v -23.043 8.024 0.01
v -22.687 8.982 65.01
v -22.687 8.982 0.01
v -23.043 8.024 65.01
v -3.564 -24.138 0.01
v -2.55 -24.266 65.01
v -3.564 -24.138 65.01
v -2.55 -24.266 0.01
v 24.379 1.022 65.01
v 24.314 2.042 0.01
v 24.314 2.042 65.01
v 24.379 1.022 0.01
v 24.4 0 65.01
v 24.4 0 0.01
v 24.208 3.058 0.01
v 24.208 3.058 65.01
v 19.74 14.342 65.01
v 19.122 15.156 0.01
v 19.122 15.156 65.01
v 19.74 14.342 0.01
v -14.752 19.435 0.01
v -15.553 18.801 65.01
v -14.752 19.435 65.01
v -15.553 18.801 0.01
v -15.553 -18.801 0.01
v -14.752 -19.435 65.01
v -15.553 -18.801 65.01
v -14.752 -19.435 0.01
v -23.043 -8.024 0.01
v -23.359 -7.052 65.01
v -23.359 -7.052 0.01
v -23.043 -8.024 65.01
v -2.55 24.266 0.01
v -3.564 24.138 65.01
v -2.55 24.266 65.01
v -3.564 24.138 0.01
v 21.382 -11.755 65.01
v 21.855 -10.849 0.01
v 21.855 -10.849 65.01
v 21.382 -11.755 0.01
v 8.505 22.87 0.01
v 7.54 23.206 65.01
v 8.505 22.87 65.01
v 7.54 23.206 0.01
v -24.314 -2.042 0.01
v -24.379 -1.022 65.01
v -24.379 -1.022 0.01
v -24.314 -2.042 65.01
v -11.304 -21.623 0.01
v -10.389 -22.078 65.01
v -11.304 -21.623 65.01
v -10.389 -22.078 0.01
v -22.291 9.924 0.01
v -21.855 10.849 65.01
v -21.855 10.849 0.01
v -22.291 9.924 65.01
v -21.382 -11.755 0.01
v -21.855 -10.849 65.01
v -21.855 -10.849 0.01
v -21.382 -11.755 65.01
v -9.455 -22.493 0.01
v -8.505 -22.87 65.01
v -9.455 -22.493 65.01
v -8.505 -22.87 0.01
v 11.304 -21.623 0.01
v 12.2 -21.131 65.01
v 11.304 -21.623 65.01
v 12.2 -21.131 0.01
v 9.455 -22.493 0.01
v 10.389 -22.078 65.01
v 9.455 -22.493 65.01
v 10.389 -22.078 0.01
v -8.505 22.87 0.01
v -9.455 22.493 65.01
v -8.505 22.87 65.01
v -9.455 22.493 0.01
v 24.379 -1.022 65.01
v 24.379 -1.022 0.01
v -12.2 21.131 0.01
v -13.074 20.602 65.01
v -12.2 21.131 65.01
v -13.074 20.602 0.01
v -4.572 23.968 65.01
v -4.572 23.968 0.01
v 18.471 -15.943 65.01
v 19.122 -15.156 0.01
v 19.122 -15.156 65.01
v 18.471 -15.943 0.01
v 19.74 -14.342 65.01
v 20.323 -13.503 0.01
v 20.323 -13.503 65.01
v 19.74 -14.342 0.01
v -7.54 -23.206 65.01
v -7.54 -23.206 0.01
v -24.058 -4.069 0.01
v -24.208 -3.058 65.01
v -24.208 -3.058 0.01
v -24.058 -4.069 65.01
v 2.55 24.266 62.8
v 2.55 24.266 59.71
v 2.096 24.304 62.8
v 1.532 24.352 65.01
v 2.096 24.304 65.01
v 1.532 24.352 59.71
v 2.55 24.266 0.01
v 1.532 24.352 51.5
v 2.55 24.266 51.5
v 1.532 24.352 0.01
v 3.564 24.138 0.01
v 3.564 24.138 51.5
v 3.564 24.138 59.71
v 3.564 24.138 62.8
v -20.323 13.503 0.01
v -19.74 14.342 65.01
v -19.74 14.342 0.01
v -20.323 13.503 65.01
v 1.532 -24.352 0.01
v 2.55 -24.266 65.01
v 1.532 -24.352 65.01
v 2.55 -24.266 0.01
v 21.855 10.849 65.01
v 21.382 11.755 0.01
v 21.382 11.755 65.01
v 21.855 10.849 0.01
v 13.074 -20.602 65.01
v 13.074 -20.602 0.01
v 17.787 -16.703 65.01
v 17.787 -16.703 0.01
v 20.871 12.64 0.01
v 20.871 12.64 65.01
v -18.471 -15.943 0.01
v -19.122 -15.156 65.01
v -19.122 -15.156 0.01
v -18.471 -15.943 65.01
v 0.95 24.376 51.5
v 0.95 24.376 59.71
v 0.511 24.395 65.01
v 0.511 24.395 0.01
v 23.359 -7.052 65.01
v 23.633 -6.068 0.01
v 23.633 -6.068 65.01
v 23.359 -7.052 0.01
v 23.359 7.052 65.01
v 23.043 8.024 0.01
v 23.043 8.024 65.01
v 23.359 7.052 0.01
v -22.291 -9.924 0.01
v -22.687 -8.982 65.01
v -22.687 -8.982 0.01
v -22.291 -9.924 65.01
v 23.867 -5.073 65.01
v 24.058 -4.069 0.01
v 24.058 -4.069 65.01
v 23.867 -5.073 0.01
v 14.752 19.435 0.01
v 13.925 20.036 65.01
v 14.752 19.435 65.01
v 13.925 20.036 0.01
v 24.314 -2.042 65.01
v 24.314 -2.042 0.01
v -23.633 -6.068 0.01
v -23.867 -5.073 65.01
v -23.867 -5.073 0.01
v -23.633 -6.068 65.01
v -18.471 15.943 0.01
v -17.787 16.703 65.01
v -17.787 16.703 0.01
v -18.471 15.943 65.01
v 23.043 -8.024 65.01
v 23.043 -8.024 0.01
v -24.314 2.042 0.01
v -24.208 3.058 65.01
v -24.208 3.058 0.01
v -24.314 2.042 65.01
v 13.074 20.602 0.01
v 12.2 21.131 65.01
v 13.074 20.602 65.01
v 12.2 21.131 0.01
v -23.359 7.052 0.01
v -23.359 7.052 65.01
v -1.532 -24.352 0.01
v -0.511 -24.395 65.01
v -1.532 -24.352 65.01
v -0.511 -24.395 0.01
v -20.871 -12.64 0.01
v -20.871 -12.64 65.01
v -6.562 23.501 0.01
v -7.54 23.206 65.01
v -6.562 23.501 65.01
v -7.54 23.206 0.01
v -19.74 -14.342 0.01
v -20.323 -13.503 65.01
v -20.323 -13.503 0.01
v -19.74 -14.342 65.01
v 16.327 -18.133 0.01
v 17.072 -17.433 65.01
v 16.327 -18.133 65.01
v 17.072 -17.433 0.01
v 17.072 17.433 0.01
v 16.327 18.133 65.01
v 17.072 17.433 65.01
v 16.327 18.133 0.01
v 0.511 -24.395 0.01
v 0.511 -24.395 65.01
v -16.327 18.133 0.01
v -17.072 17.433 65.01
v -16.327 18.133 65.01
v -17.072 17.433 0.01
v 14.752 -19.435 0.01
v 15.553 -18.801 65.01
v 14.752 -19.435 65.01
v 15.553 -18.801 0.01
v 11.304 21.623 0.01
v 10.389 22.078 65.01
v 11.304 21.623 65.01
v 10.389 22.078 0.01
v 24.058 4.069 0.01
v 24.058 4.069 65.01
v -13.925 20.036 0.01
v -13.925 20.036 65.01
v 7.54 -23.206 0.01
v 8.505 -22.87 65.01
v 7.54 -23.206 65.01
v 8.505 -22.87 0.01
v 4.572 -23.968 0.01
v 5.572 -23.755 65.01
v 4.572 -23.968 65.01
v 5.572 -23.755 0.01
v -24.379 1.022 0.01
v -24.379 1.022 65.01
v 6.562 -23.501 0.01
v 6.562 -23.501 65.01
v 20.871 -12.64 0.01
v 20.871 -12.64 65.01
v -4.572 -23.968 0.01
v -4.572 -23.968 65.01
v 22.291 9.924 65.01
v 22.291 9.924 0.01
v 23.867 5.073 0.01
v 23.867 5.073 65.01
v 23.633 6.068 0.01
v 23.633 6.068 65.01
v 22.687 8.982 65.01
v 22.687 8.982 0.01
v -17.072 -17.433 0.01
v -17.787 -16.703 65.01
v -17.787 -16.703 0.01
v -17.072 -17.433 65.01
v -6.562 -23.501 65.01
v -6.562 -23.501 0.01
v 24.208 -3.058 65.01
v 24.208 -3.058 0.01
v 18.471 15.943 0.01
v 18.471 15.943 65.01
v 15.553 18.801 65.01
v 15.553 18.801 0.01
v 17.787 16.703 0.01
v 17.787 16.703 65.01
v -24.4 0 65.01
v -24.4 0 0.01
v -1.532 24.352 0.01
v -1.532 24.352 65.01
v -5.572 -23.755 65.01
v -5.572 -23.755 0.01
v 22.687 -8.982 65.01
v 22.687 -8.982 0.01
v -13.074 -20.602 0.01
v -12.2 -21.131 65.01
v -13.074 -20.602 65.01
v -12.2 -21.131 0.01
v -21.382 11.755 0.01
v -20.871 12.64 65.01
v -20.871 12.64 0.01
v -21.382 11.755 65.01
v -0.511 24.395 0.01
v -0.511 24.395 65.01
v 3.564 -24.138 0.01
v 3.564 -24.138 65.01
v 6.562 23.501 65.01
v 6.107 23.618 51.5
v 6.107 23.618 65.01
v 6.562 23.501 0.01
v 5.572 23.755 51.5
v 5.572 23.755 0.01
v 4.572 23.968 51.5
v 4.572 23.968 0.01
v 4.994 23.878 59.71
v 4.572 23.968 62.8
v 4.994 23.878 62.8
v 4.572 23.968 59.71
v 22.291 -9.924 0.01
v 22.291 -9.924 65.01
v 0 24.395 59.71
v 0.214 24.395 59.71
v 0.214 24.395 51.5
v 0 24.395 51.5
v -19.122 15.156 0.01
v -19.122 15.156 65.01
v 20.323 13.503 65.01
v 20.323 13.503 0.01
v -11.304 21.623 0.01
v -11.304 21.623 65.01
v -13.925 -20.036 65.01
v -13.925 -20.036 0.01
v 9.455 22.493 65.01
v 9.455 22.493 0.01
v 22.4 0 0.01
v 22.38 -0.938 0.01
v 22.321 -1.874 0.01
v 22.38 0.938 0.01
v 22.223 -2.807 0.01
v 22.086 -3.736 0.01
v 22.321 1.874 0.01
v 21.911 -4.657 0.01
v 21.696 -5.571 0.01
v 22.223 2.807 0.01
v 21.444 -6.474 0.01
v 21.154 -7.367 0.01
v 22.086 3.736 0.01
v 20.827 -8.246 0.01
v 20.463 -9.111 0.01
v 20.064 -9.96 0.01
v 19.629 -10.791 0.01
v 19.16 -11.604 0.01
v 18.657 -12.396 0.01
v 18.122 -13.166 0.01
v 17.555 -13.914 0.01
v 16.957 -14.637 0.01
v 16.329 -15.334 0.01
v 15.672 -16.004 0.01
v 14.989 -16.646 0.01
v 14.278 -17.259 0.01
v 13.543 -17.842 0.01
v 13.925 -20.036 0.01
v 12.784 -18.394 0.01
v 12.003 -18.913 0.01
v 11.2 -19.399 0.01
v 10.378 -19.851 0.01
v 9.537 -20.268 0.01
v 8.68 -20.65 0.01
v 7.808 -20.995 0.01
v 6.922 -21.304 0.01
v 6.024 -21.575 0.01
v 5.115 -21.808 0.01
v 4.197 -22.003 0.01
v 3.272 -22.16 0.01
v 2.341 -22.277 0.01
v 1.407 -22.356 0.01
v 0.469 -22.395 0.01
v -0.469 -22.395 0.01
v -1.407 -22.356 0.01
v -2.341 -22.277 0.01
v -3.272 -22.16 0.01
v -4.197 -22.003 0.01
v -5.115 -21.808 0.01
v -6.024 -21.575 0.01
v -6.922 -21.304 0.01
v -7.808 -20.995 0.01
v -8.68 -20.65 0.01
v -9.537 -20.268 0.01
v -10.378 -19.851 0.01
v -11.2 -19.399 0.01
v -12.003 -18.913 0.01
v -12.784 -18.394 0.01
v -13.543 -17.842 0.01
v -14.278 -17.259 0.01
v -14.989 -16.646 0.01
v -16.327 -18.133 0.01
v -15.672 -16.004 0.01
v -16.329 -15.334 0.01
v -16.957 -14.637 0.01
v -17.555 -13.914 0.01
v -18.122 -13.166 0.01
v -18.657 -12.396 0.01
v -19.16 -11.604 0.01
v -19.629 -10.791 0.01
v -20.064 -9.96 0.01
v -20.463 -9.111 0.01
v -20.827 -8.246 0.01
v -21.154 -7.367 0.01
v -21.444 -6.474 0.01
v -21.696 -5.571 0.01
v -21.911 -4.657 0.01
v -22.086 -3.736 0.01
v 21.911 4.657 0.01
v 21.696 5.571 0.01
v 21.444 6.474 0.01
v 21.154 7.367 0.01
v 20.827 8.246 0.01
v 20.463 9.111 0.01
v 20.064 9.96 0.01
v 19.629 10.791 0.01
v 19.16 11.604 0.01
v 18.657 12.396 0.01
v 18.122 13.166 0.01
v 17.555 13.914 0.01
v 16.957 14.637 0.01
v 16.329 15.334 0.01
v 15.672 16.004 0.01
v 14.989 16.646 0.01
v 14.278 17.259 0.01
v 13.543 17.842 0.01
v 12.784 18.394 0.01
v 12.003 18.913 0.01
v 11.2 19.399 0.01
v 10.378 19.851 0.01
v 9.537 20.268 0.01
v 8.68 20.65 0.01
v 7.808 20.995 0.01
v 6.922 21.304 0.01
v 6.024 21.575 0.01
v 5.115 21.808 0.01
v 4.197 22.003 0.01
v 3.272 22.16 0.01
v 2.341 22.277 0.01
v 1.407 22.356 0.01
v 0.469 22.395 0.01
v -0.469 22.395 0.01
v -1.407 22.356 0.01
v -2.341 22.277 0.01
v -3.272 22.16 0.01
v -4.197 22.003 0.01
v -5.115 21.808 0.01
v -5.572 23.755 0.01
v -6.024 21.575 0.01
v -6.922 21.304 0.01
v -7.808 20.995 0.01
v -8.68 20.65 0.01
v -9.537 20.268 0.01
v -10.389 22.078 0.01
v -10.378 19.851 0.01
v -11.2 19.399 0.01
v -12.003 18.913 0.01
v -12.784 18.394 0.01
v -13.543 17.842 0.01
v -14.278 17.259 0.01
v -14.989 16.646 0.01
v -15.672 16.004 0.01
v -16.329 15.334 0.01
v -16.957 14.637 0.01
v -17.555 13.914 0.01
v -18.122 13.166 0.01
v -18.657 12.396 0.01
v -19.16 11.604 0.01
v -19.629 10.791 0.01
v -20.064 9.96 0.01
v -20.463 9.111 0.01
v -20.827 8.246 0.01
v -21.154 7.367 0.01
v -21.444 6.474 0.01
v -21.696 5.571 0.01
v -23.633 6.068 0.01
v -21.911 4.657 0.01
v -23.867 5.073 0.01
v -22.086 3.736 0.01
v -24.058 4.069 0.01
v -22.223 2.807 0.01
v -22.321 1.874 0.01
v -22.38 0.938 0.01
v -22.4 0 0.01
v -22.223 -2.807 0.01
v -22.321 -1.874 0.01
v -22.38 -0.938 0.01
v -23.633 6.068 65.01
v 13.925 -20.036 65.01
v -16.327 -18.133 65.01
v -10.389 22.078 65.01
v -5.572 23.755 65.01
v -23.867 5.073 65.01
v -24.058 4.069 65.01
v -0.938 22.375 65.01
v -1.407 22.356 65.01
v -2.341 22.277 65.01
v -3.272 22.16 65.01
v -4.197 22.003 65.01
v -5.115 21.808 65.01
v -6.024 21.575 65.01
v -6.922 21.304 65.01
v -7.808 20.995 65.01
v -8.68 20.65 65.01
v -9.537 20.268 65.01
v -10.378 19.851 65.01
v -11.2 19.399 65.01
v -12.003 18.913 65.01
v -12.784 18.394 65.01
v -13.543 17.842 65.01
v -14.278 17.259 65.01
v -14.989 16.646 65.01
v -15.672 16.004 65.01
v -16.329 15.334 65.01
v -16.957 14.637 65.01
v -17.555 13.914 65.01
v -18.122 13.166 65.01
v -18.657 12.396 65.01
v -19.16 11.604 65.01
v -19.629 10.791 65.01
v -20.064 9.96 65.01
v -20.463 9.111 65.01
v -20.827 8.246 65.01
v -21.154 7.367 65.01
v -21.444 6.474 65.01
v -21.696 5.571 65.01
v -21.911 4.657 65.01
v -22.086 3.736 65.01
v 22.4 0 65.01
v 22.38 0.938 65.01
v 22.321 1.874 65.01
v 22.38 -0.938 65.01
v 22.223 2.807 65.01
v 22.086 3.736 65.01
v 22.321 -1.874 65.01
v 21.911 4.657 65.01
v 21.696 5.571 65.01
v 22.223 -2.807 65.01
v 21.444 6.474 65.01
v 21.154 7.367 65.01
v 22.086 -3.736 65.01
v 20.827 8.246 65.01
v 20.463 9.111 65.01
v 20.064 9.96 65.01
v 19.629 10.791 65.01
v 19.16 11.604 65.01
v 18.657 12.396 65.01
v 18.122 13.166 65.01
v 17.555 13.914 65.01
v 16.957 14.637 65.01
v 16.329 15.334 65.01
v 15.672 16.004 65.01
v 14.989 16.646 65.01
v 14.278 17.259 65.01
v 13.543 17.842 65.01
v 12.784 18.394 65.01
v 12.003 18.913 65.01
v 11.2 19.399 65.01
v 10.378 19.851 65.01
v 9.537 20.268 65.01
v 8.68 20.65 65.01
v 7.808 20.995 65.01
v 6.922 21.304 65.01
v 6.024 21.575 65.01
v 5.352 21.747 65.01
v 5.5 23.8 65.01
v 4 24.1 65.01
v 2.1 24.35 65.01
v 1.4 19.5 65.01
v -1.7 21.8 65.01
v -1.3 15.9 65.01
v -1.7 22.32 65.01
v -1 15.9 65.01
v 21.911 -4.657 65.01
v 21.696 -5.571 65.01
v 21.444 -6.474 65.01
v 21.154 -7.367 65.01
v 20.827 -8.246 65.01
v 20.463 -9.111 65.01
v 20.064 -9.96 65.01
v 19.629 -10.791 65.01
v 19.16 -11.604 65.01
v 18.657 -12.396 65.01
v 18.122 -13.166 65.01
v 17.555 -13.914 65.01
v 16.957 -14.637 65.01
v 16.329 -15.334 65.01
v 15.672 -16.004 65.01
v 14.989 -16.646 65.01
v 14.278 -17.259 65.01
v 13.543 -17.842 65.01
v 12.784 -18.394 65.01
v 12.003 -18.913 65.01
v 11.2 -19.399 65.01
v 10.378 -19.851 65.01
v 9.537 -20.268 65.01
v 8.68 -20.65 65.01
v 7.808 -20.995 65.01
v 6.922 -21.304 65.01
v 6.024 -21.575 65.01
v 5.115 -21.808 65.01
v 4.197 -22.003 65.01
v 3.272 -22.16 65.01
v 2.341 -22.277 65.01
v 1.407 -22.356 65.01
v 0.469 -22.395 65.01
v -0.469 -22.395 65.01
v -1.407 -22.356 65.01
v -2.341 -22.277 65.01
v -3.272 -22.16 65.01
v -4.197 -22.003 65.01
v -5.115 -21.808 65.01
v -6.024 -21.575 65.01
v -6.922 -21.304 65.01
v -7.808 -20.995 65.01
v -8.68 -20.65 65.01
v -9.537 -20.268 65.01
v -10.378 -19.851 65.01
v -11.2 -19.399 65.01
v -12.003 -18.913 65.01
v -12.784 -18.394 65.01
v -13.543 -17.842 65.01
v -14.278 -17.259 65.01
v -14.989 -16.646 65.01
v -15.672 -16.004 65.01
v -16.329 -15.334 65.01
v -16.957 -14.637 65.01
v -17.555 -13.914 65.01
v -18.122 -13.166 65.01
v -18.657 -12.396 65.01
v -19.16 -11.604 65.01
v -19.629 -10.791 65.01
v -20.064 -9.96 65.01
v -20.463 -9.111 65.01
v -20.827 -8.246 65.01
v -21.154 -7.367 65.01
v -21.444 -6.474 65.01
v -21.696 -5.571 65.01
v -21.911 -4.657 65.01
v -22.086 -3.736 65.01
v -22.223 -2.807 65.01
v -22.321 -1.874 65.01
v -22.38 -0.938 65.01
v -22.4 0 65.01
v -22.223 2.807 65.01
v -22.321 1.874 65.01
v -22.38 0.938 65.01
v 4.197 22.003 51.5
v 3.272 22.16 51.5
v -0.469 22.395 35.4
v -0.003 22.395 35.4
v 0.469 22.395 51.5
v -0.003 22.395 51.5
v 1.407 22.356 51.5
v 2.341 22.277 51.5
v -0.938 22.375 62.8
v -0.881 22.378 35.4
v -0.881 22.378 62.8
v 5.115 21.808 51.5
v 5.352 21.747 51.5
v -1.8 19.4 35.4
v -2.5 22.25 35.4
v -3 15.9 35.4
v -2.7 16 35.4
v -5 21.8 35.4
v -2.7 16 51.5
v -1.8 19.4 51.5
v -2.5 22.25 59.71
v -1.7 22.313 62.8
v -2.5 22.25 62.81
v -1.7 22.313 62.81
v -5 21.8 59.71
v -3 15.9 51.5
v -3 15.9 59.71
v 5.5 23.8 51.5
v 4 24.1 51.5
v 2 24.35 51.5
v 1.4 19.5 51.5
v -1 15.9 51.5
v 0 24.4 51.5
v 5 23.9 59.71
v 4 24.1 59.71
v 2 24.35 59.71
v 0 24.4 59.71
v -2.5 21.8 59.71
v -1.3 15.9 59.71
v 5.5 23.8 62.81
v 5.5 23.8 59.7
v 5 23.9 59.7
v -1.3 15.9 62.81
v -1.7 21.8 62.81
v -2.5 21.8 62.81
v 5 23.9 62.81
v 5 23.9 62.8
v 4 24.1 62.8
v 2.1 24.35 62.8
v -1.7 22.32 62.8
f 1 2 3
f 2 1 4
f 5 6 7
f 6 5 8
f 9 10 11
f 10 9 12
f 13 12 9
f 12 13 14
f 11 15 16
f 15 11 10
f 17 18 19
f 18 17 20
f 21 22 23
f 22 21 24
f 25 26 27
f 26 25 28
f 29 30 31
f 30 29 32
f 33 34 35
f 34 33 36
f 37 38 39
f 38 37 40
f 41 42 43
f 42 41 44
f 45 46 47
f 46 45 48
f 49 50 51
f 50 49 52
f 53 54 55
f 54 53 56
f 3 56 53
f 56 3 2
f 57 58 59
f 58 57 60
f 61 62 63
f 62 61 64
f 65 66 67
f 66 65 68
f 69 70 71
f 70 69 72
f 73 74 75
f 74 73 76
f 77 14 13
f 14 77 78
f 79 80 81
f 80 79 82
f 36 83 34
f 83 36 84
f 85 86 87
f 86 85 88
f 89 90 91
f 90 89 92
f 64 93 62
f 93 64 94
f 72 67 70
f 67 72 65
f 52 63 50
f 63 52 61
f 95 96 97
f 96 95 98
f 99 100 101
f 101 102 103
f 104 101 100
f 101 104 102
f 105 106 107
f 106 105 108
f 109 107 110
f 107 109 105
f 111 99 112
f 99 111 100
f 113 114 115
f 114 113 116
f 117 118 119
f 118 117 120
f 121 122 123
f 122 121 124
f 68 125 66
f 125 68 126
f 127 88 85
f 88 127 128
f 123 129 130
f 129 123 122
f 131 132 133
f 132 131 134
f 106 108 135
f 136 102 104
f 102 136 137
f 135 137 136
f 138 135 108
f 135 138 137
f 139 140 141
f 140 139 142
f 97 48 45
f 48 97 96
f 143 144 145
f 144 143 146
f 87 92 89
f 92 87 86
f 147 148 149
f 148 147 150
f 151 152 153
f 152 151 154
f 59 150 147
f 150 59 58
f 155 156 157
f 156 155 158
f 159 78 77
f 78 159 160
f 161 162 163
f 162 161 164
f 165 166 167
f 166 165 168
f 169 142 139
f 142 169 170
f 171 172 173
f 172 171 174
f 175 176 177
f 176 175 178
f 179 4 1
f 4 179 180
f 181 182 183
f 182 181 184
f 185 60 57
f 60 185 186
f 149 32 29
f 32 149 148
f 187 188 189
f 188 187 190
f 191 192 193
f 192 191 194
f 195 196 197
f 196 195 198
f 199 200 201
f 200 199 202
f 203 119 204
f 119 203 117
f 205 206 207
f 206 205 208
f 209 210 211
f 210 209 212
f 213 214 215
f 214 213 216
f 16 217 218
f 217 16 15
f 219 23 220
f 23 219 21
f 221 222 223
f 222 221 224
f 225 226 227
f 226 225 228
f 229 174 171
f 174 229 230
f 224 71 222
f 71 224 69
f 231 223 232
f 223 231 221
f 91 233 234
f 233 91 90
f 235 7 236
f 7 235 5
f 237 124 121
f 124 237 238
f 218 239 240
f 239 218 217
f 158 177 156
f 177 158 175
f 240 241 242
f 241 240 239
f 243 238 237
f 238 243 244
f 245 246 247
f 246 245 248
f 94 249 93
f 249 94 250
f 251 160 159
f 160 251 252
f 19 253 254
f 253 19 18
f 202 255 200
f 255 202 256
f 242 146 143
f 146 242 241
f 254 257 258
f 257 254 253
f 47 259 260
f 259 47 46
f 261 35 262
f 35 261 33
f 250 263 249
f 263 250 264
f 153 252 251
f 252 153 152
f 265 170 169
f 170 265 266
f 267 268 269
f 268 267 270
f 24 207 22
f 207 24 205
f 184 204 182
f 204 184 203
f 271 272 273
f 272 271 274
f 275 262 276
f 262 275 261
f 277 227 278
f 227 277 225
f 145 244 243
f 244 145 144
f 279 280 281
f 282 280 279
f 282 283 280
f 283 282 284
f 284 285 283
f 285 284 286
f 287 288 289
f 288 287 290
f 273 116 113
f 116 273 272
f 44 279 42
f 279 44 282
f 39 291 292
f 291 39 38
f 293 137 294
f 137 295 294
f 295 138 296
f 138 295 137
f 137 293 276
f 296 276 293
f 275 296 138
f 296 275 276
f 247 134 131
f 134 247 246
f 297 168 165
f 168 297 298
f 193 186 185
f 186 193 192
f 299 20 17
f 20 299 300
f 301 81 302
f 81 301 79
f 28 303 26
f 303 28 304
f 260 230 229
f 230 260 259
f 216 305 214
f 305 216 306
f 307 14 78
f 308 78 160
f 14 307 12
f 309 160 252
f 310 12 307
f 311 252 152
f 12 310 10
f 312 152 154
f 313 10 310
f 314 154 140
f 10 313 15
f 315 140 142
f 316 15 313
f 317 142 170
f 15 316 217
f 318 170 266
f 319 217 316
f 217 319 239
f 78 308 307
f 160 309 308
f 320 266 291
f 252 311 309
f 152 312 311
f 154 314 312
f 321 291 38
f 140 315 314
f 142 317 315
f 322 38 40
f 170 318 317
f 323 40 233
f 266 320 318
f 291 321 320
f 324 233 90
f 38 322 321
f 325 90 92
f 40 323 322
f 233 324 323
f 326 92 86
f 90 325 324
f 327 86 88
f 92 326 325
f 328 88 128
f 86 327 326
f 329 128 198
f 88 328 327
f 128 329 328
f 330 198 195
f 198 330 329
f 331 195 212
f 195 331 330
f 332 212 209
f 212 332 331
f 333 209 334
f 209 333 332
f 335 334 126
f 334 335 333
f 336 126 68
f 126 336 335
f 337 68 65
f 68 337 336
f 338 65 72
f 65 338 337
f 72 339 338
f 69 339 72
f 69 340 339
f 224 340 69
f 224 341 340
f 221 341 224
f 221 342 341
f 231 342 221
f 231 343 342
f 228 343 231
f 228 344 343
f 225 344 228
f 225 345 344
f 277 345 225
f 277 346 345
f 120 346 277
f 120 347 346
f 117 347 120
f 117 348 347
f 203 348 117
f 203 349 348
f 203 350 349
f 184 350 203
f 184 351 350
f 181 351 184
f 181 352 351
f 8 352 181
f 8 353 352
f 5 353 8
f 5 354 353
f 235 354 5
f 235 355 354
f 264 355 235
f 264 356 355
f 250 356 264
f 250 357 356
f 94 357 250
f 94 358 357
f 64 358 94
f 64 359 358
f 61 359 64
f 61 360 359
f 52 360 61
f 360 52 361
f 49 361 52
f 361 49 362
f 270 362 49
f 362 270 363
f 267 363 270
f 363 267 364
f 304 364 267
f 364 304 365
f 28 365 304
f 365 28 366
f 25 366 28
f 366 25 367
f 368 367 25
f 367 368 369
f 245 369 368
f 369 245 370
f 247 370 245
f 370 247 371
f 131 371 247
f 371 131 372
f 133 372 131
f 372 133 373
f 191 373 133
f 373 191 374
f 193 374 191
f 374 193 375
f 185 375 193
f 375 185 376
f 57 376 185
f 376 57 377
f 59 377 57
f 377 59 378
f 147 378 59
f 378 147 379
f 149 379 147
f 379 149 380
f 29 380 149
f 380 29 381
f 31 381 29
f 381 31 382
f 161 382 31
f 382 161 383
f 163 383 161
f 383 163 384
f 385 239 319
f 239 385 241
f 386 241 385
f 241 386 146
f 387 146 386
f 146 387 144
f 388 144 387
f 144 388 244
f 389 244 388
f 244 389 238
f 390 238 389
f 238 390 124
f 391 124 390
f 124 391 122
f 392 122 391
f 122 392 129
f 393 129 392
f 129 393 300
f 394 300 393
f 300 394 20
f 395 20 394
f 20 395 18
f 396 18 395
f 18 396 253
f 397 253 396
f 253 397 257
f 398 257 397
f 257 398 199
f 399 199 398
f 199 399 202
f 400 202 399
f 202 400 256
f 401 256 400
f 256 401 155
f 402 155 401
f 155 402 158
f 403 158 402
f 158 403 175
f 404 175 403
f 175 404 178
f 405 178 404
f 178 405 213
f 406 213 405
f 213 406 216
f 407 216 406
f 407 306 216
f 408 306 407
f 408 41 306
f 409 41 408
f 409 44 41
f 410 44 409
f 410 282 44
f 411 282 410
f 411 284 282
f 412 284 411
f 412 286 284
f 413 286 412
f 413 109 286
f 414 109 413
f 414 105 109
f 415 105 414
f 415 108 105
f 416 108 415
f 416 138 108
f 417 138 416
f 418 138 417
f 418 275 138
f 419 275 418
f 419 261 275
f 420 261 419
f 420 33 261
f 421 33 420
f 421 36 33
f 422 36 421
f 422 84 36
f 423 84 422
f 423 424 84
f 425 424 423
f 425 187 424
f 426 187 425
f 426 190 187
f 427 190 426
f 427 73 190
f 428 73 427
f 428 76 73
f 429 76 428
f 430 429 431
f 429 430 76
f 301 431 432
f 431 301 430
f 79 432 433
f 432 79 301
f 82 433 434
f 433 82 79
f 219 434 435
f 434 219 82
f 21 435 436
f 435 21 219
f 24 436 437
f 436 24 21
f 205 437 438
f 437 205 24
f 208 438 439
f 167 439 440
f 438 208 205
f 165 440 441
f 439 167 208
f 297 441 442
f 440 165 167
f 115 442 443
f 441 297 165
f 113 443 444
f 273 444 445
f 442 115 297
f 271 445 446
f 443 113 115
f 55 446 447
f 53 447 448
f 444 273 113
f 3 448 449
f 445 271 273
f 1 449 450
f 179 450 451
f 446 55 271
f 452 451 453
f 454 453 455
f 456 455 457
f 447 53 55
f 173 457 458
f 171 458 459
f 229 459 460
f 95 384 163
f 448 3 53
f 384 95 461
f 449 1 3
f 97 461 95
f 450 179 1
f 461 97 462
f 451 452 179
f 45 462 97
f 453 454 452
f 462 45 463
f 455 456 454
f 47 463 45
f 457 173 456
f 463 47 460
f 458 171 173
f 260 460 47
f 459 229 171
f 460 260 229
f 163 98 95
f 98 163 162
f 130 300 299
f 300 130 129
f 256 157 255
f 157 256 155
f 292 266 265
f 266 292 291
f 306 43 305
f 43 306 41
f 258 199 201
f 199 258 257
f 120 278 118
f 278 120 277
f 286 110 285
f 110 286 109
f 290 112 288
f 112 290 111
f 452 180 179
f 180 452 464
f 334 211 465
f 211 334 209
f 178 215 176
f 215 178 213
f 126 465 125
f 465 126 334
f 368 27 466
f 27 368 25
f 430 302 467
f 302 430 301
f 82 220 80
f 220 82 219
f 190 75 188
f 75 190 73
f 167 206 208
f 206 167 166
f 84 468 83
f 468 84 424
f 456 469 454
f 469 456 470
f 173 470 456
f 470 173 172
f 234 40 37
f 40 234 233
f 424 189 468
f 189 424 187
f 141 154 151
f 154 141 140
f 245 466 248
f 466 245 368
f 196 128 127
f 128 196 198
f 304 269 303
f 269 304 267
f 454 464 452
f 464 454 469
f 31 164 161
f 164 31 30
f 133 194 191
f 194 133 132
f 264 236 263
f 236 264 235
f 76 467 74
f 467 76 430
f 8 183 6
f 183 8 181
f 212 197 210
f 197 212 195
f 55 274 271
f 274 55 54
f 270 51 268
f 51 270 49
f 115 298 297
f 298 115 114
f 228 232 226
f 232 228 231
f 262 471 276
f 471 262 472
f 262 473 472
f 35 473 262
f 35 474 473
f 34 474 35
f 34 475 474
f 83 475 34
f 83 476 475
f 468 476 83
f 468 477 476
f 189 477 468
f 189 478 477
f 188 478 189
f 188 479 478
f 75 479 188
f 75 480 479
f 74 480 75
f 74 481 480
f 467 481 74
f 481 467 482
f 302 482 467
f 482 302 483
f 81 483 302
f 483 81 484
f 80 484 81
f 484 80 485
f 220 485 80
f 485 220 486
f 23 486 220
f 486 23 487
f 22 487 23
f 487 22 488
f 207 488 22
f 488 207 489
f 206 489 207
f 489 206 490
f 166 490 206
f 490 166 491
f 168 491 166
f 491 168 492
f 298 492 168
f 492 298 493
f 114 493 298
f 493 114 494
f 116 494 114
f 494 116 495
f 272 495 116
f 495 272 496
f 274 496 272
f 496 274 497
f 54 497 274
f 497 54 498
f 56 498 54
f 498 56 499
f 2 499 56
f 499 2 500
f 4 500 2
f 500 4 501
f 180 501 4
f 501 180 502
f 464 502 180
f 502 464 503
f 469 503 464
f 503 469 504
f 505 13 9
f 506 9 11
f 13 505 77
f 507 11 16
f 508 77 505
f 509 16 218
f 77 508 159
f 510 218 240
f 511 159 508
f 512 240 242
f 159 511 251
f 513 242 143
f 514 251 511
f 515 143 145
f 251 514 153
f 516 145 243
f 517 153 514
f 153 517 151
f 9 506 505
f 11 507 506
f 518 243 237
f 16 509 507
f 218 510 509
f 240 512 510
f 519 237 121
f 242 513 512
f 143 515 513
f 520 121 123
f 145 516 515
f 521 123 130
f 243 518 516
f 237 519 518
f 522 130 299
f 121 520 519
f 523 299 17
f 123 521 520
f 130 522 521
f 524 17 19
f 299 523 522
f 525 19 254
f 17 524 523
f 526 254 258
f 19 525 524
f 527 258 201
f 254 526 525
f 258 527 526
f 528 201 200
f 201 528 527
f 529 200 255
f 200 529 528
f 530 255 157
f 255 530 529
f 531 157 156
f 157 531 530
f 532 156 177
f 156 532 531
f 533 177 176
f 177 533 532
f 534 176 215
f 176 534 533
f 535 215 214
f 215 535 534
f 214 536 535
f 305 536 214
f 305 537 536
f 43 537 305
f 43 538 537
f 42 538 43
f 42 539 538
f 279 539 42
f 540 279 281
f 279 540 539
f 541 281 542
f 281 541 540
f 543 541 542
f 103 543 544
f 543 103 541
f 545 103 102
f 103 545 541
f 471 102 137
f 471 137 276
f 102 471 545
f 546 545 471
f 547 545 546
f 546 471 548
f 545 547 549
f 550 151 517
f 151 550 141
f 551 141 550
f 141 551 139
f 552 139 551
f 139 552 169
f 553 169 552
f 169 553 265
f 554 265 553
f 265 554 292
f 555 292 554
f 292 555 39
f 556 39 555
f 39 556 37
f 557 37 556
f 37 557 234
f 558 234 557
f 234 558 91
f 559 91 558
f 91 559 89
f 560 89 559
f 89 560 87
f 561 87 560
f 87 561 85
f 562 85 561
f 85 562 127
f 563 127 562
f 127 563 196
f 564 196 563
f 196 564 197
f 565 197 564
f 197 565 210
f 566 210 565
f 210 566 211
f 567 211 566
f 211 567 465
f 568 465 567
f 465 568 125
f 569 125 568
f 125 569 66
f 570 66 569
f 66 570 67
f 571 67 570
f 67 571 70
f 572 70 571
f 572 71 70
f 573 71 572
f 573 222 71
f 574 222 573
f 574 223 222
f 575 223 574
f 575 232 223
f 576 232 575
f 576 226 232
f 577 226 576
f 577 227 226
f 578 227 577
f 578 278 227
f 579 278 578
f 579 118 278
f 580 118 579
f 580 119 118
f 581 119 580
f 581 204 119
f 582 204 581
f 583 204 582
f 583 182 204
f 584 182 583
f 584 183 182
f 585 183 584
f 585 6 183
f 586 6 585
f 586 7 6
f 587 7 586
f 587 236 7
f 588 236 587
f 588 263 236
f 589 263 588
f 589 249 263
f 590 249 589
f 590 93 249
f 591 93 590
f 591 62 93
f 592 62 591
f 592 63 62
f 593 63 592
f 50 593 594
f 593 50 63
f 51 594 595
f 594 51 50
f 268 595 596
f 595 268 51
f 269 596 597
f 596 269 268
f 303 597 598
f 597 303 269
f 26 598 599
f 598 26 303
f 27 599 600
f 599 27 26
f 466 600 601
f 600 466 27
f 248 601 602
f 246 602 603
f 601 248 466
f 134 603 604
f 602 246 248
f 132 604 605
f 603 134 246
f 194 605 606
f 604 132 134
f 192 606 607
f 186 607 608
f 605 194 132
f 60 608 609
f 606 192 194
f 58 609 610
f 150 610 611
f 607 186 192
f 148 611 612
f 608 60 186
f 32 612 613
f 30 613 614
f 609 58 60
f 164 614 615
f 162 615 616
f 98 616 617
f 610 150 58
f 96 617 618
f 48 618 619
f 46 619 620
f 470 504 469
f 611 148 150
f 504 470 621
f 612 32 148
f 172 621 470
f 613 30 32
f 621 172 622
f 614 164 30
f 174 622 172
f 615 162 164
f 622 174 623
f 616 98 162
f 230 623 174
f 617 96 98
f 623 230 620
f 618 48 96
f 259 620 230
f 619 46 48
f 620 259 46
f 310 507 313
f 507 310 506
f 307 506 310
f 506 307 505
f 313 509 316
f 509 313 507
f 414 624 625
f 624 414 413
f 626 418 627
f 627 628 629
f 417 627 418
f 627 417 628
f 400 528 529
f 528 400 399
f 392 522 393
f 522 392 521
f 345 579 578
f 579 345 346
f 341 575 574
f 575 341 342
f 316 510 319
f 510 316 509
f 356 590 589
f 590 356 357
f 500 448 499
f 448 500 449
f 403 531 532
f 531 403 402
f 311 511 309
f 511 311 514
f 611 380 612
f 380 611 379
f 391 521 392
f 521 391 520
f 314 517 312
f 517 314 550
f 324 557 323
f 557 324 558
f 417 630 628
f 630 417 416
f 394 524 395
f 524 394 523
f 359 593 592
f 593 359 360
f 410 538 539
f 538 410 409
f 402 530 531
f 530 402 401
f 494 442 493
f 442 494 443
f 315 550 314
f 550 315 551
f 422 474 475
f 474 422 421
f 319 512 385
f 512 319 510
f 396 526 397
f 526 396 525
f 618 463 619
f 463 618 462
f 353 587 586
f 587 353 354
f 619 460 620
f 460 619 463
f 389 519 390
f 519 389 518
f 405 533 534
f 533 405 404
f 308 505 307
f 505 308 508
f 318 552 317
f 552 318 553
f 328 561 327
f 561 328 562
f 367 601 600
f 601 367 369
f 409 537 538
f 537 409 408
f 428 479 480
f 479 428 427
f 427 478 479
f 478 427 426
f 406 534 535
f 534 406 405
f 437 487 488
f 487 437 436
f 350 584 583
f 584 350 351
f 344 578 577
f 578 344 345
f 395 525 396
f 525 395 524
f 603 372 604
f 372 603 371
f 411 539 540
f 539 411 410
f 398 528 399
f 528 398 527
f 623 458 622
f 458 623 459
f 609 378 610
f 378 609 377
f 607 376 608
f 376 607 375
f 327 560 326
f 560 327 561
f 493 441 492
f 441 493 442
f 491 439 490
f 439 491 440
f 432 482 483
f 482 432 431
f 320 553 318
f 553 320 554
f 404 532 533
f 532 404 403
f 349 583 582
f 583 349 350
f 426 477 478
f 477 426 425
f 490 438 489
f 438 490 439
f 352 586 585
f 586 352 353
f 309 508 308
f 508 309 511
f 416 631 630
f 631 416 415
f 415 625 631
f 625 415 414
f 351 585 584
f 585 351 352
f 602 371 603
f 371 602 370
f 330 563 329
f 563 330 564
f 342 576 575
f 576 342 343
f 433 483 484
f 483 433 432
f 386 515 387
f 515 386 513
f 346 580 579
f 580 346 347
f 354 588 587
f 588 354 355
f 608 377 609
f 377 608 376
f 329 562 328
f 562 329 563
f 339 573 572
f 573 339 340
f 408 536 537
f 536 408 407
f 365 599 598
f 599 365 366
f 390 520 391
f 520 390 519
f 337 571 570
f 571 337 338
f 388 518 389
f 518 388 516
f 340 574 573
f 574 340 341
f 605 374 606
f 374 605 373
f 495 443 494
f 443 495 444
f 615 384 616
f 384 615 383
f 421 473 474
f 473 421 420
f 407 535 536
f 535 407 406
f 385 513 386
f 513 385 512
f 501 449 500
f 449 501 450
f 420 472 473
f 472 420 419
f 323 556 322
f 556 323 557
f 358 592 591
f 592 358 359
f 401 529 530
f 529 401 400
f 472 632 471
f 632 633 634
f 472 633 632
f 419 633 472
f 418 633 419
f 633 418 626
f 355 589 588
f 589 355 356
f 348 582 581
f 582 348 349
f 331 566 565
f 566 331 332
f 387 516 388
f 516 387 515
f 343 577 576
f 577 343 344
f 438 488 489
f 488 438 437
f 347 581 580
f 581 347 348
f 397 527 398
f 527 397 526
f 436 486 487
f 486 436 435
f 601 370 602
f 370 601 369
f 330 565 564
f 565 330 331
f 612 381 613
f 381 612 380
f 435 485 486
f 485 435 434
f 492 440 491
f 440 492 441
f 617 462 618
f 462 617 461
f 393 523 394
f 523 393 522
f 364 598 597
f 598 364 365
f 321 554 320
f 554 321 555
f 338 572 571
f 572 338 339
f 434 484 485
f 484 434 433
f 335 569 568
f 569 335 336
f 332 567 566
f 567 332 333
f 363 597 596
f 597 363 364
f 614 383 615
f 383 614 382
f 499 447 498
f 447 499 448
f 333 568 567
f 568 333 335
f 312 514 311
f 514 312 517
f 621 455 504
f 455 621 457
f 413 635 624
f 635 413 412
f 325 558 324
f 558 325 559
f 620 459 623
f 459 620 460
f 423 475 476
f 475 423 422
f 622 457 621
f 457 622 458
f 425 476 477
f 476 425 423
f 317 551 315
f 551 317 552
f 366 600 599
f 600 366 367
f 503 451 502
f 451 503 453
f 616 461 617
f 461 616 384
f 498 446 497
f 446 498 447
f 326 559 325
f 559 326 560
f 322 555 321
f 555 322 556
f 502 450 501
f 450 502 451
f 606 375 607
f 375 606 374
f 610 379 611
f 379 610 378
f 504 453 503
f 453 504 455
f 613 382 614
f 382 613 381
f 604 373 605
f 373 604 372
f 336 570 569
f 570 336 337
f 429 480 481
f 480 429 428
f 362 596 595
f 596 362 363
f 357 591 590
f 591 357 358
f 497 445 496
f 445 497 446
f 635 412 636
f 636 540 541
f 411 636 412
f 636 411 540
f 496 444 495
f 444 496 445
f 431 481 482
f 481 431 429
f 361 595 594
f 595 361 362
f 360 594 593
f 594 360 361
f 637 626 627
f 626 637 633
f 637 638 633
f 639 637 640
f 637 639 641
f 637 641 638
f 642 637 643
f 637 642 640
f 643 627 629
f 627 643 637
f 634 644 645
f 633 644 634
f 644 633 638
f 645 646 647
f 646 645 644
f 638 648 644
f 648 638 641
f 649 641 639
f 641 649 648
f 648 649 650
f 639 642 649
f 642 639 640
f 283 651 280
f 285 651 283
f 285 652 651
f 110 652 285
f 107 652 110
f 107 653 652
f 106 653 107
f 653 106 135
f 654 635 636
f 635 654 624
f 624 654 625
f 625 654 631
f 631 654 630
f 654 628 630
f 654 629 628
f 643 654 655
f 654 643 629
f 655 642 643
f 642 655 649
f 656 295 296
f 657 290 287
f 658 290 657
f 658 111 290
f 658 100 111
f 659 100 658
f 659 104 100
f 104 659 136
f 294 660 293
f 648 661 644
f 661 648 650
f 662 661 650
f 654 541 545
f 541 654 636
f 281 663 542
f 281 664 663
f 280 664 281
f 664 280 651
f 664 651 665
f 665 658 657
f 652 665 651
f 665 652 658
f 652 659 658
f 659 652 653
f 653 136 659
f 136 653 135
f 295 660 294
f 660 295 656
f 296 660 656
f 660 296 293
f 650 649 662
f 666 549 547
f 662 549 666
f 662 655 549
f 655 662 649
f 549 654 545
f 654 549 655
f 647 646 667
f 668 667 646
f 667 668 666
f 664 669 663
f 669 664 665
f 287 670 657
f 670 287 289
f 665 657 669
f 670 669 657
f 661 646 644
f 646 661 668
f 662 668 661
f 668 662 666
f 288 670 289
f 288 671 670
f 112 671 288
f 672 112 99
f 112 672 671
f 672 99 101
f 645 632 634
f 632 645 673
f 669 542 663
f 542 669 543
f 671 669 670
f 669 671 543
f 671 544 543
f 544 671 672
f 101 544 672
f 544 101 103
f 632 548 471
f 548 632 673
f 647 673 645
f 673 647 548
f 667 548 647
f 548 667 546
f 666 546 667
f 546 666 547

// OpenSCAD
valve_h = 65;
valve_outer_d = 48.8;
valve_outer_th = 2;
valve_inner_r = (valve_outer_d/2 - valve_outer_th);


$fn=150;

// valve body
#difference(){
    translate([0,0,.01])
    cylinder(d=valve_outer_d, h=valve_h);

    translate([0,0,-1])
    cylinder(d=valve_outer_d-valve_outer_th*2, h=70);
}

// lower support (stick)
support_h = 29.6; // full height
support_lower_h = 16.1;
support_lower_off = valve_h - support_h;
color([0,.99,.99,.6])
translate([-5, valve_inner_r, support_lower_off])
linear_extrude(height=support_lower_h+.01) {
    polygon(points=[
        [0, -0.6],
        [2.5, -0.15],
        [4.4, 0],
        [5, 0],
        [3.2, -3],
        [2.3, -6.4],
        [2, -6.5]]);
}

// middle support block
support_middle_h = 8.2;
support_middle_off = support_lower_off + support_lower_h;
color([0.5,.5,.99,.6])
translate([-5, valve_inner_r, support_middle_off])
linear_extrude(height=support_middle_h+.01) {
    polygon(points=[
        [0, -0.6],
        [2.5, -0.15],
        [4.4, 0],
        [4.5, 0.4],
        [5, 0.4],
        [5, 2],
        [7, 1.95],
        [9, 1.7],
        [10, 1.5],
        [10.5, 1.4],
        [11.5, 1.1],
        [11.5, 0],
        [6.4, -2.9], // bat notch
        [4, -6.5],
        [2, -6.5]]);
}

// upper support block
support_upper_h = 3.1;
support_upper_off = support_middle_off + support_middle_h;
color([0,.99,.2,.6])
translate([-5, valve_inner_r, support_upper_off])
linear_extrude(height=support_upper_h+.01) {
    polygon(points=[
        [2.5, -0.6],
        [2.5, -0.15],
        [4.4, 0],
        [4.5, 0.4],
        [5, 0.4],
        [5, 0.75],
        [7, 0.65],
        [9, 0.45],
        [9.7, 0.32],
        [10, 1.5],
        [10.5, 1.4],
        [11.5, 1.1],
        [11.5, 0],
        [6.4, -2.9], // bat notch
        [4, -6.5],
        [3.7, -6.5]]);
}

// top support block
support_top_h = support_h - support_lower_h - support_middle_h - support_upper_h;
support_top_off = support_upper_off + support_upper_h;
color([0.6,.6,.2,.6])
translate([-5, valve_inner_r, support_top_off])
linear_extrude(height=support_top_h+.01) {
    polygon(points=[
        [3.3, -0.6],
        [3.3, -0.08],
        [4.4, 0],
        [4.5, 0.4],
        [5, 0.4],
        [5, 0.75],
        [7, 0.65],
        [7.1, 1.95],
        [9, 1.7],
        [10, 1.5],
        [10.5, 1.4],
        [11.5, 1.1],
        [11.5, 0],
        [6.4, -2.9], // bat notch
        [4, -6.5],
        [3.7, -6.5]]);
}
